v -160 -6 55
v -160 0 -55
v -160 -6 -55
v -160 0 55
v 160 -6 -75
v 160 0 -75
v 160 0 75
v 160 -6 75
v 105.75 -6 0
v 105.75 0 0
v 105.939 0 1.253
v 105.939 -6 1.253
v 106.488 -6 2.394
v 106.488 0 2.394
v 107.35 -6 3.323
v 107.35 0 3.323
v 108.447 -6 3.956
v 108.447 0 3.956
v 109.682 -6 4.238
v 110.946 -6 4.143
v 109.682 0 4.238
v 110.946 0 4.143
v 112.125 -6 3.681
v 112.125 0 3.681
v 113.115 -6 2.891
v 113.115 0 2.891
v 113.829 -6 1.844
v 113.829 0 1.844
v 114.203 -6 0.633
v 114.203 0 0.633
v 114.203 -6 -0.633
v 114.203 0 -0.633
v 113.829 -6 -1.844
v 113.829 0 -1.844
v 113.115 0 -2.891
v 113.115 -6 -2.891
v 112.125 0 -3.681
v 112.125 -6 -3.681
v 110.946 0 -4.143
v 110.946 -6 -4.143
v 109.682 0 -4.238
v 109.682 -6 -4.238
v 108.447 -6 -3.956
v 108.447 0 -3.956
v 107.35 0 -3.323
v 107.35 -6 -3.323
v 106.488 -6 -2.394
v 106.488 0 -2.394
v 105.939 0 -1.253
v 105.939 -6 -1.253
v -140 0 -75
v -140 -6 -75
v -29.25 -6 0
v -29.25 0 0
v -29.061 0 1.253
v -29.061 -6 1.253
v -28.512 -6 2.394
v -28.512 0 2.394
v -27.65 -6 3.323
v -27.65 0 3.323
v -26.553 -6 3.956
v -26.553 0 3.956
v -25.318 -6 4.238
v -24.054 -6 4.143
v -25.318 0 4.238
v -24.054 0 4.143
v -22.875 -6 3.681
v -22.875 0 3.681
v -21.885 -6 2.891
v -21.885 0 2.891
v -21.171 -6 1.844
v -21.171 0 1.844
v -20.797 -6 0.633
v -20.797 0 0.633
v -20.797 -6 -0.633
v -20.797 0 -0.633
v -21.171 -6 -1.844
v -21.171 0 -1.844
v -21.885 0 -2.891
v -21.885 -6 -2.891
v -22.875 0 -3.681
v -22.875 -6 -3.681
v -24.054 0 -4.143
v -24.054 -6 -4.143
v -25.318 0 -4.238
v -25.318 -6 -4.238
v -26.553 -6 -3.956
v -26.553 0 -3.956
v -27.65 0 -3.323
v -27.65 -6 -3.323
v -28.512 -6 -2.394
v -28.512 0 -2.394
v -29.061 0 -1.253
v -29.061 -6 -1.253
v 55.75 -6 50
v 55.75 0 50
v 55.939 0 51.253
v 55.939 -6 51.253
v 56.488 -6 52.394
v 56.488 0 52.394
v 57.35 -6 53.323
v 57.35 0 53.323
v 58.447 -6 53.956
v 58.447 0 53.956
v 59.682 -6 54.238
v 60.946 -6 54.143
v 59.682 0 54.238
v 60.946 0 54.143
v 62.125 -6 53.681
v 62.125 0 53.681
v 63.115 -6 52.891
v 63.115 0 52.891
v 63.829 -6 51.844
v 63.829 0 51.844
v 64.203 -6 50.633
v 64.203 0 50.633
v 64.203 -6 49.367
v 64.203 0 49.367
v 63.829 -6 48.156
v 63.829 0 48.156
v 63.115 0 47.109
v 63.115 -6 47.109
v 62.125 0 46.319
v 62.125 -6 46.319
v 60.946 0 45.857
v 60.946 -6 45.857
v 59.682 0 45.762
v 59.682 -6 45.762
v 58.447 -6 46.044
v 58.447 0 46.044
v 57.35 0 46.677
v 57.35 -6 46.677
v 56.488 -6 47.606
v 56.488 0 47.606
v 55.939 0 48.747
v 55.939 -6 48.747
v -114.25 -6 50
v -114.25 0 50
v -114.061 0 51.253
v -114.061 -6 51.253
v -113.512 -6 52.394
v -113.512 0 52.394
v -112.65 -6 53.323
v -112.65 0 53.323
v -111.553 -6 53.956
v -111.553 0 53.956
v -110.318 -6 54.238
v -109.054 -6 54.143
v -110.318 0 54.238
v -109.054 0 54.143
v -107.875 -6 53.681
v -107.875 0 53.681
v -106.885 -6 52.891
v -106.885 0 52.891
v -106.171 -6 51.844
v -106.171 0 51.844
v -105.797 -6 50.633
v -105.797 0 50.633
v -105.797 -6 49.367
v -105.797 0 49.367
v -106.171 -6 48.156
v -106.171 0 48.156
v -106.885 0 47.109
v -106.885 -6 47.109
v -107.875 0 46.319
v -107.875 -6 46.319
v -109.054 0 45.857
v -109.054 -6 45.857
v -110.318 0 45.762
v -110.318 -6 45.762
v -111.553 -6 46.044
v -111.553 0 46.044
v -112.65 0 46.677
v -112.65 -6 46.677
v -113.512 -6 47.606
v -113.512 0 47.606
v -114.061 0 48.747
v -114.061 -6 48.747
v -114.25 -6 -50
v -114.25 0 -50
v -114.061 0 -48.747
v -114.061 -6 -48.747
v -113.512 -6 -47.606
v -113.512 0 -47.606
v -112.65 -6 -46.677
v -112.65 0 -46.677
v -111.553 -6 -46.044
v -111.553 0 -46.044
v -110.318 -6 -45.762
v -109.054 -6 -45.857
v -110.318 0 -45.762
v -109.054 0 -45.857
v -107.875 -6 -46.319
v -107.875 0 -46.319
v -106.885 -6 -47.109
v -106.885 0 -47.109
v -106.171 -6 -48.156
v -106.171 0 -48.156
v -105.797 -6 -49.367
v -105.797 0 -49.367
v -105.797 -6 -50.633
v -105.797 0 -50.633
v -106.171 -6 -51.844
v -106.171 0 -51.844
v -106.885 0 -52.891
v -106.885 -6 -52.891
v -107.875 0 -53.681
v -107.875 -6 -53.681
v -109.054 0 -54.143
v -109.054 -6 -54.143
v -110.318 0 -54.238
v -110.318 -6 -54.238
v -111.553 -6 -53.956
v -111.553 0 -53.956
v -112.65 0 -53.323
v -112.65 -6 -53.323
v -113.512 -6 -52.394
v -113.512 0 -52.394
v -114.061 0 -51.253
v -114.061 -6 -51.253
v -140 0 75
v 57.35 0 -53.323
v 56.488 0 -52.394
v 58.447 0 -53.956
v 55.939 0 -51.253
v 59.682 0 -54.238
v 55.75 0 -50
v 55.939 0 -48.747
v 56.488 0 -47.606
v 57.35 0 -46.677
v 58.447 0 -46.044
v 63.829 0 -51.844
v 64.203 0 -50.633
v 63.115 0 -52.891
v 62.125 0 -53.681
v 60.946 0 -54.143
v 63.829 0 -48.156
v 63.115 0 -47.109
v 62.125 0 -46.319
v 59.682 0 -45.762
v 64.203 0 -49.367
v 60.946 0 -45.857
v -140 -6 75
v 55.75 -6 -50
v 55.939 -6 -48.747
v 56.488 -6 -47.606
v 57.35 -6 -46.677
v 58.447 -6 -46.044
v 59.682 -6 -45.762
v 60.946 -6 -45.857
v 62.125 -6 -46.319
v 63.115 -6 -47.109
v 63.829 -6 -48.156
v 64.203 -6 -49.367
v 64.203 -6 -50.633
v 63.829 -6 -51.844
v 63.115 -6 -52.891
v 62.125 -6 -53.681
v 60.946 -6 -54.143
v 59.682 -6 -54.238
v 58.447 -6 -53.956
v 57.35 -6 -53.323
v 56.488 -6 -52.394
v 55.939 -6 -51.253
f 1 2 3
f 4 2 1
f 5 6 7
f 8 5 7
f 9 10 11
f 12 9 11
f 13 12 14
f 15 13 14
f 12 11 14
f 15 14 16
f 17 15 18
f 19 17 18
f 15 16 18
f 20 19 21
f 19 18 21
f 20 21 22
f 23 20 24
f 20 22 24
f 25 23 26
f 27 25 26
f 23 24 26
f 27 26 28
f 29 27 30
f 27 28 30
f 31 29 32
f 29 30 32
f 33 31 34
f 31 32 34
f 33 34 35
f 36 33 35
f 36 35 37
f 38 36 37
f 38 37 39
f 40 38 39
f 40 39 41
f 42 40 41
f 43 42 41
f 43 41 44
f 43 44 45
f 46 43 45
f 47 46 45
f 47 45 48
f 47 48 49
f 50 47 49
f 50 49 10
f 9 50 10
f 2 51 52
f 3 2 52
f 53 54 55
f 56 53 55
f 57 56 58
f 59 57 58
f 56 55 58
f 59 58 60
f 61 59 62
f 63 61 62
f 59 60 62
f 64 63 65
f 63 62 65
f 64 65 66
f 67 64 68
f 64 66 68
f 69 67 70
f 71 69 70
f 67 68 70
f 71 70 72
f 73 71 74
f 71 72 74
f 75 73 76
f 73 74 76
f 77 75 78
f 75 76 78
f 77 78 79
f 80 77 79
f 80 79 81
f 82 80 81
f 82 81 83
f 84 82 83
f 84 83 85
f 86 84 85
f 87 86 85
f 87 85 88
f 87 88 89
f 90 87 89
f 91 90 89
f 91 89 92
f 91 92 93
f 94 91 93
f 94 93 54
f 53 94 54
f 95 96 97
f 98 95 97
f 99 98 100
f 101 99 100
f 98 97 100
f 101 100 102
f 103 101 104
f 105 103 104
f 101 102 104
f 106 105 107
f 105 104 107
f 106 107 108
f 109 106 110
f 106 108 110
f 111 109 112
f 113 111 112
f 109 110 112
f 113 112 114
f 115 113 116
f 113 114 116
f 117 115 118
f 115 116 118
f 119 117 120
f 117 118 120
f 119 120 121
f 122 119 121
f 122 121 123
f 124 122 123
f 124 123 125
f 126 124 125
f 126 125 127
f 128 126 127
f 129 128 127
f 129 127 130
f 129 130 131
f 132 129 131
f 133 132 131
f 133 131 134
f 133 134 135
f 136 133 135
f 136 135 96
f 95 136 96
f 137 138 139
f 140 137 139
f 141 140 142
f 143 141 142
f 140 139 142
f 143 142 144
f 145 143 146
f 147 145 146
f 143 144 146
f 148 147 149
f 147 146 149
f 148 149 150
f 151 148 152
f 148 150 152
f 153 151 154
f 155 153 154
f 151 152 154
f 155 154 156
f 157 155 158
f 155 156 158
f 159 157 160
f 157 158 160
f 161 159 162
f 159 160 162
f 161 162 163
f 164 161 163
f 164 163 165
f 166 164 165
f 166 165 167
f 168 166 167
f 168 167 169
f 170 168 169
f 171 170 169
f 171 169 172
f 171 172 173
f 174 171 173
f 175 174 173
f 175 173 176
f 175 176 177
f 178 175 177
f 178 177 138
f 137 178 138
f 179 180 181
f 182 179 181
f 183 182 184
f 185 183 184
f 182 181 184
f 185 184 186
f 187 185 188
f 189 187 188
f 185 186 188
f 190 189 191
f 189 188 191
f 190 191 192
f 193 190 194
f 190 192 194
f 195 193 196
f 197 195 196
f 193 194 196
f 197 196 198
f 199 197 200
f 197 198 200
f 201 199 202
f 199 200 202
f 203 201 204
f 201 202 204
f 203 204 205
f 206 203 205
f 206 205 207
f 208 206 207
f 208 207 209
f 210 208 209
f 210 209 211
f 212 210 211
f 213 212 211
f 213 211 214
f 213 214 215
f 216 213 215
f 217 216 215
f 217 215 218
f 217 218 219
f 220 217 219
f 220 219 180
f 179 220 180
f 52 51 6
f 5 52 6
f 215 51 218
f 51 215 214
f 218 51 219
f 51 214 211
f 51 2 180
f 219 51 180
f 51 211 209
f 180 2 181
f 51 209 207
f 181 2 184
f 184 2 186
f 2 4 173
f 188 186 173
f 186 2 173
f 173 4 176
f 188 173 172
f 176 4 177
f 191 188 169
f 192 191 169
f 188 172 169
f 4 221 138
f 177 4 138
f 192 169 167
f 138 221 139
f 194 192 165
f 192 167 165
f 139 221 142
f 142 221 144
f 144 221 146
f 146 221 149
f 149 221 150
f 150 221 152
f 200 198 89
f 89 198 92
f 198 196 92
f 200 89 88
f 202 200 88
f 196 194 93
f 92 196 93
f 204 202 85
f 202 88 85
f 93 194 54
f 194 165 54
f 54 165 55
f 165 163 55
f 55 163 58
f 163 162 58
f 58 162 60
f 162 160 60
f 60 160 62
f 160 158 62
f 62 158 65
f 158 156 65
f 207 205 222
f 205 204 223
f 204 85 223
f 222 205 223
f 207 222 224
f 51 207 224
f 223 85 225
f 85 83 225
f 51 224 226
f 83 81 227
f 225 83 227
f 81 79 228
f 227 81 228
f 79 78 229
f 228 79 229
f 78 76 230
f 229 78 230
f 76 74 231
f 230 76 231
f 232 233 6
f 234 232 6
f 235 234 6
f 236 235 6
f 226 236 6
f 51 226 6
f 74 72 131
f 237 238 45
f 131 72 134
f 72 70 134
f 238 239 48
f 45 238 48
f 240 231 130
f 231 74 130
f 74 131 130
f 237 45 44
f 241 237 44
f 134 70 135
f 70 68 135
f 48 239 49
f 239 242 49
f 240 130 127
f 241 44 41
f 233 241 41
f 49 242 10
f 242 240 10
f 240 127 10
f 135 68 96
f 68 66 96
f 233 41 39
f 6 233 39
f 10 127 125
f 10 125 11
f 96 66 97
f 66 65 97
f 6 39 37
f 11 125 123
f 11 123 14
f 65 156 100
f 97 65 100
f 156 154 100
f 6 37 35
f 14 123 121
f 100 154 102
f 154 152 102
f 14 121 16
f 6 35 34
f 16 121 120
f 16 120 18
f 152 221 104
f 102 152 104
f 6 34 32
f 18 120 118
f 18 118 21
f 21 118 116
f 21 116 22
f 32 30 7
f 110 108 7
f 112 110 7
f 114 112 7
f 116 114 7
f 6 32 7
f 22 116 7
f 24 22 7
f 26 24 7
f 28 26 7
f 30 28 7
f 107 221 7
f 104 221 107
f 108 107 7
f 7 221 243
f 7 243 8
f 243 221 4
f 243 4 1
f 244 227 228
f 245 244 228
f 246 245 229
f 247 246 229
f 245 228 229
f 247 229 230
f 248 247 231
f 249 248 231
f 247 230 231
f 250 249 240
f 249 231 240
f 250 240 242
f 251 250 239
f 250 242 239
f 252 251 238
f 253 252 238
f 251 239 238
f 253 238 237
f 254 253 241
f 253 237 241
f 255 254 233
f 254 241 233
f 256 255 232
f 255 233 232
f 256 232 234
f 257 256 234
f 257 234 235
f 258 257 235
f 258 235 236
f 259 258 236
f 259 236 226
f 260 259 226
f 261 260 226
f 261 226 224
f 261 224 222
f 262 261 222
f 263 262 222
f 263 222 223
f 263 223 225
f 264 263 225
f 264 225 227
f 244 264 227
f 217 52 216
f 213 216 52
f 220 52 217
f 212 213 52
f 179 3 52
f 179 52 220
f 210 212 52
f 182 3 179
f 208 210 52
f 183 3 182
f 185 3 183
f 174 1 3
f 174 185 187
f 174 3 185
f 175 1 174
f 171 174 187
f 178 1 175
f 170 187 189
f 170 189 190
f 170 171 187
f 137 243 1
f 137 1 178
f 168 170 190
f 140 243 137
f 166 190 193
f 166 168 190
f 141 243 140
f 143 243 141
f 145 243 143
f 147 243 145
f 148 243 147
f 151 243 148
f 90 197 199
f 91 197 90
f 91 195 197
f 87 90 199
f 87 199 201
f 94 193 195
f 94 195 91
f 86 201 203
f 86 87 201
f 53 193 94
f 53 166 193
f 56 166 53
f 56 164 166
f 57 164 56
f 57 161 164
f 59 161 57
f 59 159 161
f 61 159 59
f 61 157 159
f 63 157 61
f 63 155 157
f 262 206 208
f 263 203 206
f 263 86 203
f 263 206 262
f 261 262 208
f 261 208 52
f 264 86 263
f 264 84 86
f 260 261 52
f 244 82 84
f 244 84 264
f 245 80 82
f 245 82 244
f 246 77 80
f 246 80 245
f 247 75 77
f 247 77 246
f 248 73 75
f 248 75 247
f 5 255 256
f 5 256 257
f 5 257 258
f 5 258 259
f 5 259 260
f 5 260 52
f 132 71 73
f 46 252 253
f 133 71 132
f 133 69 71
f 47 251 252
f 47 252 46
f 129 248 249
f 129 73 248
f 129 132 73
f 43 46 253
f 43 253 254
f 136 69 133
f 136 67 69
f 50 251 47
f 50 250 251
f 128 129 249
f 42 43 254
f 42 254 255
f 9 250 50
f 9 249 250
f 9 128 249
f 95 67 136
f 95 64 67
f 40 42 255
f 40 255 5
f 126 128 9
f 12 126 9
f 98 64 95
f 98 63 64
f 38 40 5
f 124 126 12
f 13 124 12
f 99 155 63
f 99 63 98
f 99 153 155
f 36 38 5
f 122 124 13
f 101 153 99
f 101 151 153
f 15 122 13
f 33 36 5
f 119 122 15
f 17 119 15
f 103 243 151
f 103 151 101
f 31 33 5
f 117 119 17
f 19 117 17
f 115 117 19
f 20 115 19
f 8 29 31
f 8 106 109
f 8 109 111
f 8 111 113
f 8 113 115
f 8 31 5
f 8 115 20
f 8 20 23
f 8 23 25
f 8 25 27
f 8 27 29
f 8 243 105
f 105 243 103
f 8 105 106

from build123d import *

# Parameters (mm, degrees)
F0_W     = 320
F0_H     = 150
F1_DEPTH = 6
F2_R     = 4.25
F3_DEPTH = 25
F4_SIZE  = 20


with BuildPart() as f1:
    # F0 (on Front) → F1 (new body)
    with BuildSketch(Plane.XZ):
        Rectangle(F0_W, F0_H)
    extrude(amount=F1_DEPTH)

    # F2 (on face) → F3 (cut)
    with BuildSketch(Plane(origin=(0, 0, 0), x_dir=(-1, 0, 0), z_dir=(0, 1, 0))):
        with Locations((-60, 50)):
            Circle(F2_R)
        with Locations((110, 50)):
            Circle(F2_R)
        with BuildLine():
            ThreePointArc((20.75, 0), (25, -4.25), (29.25, 0))
            Line((29.25, 0), (20.75, 0))
        make_face()
        with BuildLine():
            Line((20.75, 0), (29.25, 0))
            ThreePointArc((29.25, 0), (25, 4.25), (20.75, 0))
        make_face()
        with BuildLine():
            ThreePointArc((-114.25, 0), (-110, -4.25), (-105.75, 0))
            Line((-105.75, 0), (-114.25, 0))
        make_face()
        with BuildLine():
            Line((-114.25, 0), (-105.75, 0))
            ThreePointArc((-105.75, 0), (-110, 4.25), (-114.25, 0))
        make_face()
        with Locations((110, -50)):
            Circle(F2_R)
        with Locations((-60, -50)):
            Circle(F2_R)
    extrude(amount=-F3_DEPTH, mode=Mode.SUBTRACT)

    # F4
    f4_edges = [f1.edges().sort_by_distance(p)[0] for p in [
        (-160, -3, 75),
        (-160, -3, -75),
    ]]
    chamfer(f4_edges, length=F4_SIZE)


solid = f1.part
